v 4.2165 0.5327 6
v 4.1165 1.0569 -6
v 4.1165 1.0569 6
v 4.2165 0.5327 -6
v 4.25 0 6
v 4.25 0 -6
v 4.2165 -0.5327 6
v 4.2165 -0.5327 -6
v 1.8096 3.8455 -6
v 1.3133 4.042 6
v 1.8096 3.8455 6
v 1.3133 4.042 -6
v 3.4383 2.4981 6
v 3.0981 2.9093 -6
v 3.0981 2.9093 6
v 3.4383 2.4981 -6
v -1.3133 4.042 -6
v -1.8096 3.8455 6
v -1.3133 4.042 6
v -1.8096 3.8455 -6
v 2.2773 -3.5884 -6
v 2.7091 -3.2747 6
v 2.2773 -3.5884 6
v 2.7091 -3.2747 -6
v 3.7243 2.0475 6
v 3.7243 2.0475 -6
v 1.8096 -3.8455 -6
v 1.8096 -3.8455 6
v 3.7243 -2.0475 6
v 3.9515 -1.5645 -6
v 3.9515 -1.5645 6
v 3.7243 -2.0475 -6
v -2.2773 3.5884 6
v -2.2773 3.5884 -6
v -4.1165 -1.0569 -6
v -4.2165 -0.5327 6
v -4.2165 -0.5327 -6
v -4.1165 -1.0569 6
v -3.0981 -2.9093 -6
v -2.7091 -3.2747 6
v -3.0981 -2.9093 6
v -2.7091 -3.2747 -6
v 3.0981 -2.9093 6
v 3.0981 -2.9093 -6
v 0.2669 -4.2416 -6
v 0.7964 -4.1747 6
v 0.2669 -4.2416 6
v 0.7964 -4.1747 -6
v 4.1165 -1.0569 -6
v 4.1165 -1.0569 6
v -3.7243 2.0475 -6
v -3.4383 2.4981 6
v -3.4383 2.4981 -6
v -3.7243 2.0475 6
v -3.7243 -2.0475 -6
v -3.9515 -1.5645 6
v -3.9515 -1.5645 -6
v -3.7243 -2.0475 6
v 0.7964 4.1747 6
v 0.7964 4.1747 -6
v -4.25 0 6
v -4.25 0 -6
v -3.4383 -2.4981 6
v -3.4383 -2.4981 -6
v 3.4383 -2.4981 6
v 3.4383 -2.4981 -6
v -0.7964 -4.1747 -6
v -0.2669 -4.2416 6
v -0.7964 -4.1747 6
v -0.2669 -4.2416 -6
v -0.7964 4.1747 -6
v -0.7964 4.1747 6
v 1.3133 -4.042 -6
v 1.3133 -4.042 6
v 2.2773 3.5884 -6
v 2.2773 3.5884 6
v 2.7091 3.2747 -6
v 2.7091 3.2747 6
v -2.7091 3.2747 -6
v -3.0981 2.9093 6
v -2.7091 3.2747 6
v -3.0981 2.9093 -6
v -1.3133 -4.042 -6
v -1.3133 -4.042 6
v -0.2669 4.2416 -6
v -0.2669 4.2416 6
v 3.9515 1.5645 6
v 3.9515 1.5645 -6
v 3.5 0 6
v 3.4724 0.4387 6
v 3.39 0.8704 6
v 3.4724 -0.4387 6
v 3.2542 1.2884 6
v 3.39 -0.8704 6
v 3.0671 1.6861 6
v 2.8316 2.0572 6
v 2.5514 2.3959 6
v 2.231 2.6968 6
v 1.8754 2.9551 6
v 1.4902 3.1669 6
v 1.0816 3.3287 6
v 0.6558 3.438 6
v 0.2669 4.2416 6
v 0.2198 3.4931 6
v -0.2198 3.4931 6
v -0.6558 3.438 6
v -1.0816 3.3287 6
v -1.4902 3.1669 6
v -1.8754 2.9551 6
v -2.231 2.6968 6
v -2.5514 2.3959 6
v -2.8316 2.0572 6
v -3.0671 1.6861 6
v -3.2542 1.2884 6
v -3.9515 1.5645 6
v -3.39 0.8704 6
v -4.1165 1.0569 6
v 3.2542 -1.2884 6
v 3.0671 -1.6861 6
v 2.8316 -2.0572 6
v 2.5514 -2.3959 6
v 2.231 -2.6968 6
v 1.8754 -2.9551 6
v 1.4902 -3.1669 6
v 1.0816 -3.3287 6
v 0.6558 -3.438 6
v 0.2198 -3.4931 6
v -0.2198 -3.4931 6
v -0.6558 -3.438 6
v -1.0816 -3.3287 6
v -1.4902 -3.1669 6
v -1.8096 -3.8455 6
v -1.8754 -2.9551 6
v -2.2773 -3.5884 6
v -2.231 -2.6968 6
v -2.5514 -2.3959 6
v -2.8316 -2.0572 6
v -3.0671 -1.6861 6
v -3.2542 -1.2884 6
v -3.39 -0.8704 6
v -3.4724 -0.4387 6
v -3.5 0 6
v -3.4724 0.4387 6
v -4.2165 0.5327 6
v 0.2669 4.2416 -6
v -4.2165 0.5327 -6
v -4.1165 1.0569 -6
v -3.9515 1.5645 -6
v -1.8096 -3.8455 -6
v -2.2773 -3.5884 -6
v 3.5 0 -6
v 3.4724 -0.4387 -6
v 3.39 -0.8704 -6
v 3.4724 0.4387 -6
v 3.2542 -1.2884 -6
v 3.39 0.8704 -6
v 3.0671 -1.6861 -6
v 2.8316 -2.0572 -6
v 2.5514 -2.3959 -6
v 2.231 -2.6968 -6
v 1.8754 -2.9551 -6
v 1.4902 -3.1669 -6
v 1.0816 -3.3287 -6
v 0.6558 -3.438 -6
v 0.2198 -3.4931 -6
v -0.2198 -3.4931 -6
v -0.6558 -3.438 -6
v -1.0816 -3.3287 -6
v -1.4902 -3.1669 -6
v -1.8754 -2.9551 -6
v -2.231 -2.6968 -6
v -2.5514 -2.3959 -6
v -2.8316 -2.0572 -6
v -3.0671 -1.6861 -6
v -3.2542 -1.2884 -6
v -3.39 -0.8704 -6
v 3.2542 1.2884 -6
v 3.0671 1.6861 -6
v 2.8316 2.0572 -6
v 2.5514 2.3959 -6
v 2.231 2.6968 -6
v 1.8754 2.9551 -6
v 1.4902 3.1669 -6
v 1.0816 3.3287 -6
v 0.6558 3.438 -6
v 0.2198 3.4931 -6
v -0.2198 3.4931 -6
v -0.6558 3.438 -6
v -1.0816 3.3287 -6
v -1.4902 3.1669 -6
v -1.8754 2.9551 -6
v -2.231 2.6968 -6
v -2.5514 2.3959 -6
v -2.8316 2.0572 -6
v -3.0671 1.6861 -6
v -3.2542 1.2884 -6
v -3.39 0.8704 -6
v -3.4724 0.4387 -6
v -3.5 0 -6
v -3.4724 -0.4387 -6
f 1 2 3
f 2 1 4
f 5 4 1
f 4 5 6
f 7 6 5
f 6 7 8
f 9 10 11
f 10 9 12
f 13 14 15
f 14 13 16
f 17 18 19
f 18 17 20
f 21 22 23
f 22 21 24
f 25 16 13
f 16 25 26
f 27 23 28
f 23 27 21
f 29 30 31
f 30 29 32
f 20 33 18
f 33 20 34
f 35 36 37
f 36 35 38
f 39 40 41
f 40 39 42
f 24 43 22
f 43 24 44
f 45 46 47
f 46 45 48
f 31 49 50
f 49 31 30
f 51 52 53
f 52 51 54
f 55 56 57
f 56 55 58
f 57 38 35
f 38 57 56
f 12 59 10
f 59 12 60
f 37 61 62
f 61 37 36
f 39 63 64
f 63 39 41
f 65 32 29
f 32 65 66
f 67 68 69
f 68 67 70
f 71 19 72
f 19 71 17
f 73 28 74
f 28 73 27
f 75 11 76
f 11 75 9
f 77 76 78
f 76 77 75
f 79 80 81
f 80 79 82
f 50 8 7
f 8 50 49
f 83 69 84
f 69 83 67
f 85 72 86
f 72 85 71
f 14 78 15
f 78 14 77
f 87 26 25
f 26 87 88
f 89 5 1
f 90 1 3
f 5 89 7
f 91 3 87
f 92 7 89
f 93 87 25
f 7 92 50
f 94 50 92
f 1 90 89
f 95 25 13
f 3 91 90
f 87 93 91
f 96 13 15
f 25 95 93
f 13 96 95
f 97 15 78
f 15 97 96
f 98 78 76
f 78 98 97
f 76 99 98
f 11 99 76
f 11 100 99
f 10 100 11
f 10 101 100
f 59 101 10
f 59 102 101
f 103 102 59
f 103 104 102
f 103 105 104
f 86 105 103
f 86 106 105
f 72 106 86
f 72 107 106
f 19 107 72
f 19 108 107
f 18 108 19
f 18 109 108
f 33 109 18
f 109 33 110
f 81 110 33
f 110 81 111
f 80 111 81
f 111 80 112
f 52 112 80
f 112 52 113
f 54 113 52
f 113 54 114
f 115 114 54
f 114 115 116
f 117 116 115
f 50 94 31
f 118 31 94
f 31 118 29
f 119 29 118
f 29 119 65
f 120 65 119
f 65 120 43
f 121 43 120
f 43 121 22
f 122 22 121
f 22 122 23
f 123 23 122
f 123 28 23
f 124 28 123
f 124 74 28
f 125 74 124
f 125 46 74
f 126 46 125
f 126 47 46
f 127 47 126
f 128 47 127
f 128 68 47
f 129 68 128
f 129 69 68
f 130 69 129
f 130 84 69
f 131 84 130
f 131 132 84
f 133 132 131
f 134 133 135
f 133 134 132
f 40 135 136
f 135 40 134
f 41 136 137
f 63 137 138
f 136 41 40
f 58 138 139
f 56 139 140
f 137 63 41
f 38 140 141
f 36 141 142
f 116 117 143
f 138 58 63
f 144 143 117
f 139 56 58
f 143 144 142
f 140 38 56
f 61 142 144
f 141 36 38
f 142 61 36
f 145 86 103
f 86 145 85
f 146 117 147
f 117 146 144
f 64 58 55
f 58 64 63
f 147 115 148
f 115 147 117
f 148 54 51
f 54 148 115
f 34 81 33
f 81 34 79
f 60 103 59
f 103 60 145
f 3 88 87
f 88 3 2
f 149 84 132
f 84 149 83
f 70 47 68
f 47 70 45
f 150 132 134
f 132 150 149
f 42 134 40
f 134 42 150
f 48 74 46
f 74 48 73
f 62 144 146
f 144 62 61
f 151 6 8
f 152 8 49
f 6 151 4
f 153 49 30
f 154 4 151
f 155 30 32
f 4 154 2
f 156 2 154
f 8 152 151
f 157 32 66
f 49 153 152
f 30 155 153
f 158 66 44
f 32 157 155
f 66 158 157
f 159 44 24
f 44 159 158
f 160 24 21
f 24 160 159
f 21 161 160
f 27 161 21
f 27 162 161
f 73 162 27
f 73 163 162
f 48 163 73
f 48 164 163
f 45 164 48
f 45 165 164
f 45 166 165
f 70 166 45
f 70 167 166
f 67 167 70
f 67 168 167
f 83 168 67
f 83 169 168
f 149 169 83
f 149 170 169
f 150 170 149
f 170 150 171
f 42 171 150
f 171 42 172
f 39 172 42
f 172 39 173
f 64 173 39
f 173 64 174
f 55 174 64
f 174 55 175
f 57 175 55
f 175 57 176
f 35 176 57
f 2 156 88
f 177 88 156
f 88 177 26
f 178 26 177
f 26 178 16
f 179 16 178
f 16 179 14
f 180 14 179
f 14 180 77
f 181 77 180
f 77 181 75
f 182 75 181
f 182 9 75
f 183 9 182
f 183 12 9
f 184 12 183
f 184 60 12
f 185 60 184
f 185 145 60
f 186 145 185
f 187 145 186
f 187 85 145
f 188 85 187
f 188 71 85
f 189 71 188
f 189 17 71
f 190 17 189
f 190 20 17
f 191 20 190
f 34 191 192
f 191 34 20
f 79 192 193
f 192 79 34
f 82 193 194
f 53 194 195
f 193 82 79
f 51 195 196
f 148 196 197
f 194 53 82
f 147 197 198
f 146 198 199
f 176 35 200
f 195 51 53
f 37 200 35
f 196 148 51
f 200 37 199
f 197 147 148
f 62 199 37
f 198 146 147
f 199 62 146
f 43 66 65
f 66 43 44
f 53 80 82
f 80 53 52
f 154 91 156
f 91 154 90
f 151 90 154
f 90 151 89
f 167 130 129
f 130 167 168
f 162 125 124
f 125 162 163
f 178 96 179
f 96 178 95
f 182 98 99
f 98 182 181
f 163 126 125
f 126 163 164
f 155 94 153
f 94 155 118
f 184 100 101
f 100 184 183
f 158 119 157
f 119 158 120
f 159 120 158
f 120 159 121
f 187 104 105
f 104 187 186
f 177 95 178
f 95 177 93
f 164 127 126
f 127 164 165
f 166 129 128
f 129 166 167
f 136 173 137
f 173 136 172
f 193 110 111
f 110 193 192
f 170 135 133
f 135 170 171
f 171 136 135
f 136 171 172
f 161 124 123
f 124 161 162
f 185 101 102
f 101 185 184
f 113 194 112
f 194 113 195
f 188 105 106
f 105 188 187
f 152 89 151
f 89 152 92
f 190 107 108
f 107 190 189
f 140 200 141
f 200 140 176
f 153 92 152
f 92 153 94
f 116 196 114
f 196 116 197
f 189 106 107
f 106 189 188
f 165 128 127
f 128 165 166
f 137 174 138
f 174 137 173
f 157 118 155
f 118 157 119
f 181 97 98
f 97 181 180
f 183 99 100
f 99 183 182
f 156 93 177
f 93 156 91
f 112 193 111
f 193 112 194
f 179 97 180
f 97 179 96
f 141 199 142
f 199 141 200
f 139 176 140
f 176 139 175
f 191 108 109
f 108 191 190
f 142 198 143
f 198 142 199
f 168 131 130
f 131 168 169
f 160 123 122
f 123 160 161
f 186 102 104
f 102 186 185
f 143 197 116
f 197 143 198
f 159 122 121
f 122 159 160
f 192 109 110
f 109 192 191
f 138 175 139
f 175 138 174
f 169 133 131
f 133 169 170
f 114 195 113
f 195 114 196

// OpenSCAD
$fn = 50;


difference() {
	union() {
		translate(v = [0, 0, -6.0000000000]) {
			cylinder(h = 12, r = 4.2500000000);
		}
	}
	union() {
		translate(v = [0, 0, -100.0000000000]) {
			cylinder(h = 200, r = 3.5000000000);
		}
	}
}
